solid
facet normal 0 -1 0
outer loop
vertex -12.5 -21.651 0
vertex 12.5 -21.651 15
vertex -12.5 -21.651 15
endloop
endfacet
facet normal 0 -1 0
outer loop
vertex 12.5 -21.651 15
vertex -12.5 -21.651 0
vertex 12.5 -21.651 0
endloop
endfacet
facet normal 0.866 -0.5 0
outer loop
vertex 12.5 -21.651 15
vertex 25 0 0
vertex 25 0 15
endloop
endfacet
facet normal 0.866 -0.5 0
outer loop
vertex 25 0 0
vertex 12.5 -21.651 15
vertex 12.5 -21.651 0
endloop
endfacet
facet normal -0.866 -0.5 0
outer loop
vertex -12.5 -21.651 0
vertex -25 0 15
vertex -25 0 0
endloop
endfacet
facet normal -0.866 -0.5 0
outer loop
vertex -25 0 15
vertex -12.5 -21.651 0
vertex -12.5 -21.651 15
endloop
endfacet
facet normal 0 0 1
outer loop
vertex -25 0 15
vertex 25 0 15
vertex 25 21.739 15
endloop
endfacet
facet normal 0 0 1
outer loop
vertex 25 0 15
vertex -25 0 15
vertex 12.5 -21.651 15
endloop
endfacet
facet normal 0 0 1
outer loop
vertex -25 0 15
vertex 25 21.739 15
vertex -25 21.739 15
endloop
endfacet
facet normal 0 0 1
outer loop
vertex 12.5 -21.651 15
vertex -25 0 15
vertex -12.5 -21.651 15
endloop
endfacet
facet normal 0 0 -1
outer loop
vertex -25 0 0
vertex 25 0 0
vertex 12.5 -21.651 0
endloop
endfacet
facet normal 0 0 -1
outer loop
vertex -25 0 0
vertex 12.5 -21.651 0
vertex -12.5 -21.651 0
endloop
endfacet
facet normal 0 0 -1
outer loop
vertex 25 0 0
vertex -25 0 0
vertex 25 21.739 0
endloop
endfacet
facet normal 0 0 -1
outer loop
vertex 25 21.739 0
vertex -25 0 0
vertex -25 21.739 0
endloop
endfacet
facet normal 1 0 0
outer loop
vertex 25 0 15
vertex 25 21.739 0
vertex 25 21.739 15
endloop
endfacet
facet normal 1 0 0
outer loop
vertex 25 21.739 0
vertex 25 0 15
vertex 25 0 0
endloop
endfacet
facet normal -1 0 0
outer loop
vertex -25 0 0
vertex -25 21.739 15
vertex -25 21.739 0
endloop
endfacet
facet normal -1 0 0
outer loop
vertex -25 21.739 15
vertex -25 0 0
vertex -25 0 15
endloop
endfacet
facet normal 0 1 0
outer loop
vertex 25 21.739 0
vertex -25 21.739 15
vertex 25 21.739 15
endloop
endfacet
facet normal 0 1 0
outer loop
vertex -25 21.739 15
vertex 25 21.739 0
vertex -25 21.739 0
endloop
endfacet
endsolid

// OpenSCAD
$fn=6;

$base_v = 15;
$base_h = 50;



module base_shape(base_width, base_height) {
    union() {
        cylinder(r=base_width/2, h=base_height);
        translate([-base_width/2,0,0]) {
            cube([base_width, base_width/2.3, base_height]);
        }
    }
}

base_shape($base_h, $base_v);
